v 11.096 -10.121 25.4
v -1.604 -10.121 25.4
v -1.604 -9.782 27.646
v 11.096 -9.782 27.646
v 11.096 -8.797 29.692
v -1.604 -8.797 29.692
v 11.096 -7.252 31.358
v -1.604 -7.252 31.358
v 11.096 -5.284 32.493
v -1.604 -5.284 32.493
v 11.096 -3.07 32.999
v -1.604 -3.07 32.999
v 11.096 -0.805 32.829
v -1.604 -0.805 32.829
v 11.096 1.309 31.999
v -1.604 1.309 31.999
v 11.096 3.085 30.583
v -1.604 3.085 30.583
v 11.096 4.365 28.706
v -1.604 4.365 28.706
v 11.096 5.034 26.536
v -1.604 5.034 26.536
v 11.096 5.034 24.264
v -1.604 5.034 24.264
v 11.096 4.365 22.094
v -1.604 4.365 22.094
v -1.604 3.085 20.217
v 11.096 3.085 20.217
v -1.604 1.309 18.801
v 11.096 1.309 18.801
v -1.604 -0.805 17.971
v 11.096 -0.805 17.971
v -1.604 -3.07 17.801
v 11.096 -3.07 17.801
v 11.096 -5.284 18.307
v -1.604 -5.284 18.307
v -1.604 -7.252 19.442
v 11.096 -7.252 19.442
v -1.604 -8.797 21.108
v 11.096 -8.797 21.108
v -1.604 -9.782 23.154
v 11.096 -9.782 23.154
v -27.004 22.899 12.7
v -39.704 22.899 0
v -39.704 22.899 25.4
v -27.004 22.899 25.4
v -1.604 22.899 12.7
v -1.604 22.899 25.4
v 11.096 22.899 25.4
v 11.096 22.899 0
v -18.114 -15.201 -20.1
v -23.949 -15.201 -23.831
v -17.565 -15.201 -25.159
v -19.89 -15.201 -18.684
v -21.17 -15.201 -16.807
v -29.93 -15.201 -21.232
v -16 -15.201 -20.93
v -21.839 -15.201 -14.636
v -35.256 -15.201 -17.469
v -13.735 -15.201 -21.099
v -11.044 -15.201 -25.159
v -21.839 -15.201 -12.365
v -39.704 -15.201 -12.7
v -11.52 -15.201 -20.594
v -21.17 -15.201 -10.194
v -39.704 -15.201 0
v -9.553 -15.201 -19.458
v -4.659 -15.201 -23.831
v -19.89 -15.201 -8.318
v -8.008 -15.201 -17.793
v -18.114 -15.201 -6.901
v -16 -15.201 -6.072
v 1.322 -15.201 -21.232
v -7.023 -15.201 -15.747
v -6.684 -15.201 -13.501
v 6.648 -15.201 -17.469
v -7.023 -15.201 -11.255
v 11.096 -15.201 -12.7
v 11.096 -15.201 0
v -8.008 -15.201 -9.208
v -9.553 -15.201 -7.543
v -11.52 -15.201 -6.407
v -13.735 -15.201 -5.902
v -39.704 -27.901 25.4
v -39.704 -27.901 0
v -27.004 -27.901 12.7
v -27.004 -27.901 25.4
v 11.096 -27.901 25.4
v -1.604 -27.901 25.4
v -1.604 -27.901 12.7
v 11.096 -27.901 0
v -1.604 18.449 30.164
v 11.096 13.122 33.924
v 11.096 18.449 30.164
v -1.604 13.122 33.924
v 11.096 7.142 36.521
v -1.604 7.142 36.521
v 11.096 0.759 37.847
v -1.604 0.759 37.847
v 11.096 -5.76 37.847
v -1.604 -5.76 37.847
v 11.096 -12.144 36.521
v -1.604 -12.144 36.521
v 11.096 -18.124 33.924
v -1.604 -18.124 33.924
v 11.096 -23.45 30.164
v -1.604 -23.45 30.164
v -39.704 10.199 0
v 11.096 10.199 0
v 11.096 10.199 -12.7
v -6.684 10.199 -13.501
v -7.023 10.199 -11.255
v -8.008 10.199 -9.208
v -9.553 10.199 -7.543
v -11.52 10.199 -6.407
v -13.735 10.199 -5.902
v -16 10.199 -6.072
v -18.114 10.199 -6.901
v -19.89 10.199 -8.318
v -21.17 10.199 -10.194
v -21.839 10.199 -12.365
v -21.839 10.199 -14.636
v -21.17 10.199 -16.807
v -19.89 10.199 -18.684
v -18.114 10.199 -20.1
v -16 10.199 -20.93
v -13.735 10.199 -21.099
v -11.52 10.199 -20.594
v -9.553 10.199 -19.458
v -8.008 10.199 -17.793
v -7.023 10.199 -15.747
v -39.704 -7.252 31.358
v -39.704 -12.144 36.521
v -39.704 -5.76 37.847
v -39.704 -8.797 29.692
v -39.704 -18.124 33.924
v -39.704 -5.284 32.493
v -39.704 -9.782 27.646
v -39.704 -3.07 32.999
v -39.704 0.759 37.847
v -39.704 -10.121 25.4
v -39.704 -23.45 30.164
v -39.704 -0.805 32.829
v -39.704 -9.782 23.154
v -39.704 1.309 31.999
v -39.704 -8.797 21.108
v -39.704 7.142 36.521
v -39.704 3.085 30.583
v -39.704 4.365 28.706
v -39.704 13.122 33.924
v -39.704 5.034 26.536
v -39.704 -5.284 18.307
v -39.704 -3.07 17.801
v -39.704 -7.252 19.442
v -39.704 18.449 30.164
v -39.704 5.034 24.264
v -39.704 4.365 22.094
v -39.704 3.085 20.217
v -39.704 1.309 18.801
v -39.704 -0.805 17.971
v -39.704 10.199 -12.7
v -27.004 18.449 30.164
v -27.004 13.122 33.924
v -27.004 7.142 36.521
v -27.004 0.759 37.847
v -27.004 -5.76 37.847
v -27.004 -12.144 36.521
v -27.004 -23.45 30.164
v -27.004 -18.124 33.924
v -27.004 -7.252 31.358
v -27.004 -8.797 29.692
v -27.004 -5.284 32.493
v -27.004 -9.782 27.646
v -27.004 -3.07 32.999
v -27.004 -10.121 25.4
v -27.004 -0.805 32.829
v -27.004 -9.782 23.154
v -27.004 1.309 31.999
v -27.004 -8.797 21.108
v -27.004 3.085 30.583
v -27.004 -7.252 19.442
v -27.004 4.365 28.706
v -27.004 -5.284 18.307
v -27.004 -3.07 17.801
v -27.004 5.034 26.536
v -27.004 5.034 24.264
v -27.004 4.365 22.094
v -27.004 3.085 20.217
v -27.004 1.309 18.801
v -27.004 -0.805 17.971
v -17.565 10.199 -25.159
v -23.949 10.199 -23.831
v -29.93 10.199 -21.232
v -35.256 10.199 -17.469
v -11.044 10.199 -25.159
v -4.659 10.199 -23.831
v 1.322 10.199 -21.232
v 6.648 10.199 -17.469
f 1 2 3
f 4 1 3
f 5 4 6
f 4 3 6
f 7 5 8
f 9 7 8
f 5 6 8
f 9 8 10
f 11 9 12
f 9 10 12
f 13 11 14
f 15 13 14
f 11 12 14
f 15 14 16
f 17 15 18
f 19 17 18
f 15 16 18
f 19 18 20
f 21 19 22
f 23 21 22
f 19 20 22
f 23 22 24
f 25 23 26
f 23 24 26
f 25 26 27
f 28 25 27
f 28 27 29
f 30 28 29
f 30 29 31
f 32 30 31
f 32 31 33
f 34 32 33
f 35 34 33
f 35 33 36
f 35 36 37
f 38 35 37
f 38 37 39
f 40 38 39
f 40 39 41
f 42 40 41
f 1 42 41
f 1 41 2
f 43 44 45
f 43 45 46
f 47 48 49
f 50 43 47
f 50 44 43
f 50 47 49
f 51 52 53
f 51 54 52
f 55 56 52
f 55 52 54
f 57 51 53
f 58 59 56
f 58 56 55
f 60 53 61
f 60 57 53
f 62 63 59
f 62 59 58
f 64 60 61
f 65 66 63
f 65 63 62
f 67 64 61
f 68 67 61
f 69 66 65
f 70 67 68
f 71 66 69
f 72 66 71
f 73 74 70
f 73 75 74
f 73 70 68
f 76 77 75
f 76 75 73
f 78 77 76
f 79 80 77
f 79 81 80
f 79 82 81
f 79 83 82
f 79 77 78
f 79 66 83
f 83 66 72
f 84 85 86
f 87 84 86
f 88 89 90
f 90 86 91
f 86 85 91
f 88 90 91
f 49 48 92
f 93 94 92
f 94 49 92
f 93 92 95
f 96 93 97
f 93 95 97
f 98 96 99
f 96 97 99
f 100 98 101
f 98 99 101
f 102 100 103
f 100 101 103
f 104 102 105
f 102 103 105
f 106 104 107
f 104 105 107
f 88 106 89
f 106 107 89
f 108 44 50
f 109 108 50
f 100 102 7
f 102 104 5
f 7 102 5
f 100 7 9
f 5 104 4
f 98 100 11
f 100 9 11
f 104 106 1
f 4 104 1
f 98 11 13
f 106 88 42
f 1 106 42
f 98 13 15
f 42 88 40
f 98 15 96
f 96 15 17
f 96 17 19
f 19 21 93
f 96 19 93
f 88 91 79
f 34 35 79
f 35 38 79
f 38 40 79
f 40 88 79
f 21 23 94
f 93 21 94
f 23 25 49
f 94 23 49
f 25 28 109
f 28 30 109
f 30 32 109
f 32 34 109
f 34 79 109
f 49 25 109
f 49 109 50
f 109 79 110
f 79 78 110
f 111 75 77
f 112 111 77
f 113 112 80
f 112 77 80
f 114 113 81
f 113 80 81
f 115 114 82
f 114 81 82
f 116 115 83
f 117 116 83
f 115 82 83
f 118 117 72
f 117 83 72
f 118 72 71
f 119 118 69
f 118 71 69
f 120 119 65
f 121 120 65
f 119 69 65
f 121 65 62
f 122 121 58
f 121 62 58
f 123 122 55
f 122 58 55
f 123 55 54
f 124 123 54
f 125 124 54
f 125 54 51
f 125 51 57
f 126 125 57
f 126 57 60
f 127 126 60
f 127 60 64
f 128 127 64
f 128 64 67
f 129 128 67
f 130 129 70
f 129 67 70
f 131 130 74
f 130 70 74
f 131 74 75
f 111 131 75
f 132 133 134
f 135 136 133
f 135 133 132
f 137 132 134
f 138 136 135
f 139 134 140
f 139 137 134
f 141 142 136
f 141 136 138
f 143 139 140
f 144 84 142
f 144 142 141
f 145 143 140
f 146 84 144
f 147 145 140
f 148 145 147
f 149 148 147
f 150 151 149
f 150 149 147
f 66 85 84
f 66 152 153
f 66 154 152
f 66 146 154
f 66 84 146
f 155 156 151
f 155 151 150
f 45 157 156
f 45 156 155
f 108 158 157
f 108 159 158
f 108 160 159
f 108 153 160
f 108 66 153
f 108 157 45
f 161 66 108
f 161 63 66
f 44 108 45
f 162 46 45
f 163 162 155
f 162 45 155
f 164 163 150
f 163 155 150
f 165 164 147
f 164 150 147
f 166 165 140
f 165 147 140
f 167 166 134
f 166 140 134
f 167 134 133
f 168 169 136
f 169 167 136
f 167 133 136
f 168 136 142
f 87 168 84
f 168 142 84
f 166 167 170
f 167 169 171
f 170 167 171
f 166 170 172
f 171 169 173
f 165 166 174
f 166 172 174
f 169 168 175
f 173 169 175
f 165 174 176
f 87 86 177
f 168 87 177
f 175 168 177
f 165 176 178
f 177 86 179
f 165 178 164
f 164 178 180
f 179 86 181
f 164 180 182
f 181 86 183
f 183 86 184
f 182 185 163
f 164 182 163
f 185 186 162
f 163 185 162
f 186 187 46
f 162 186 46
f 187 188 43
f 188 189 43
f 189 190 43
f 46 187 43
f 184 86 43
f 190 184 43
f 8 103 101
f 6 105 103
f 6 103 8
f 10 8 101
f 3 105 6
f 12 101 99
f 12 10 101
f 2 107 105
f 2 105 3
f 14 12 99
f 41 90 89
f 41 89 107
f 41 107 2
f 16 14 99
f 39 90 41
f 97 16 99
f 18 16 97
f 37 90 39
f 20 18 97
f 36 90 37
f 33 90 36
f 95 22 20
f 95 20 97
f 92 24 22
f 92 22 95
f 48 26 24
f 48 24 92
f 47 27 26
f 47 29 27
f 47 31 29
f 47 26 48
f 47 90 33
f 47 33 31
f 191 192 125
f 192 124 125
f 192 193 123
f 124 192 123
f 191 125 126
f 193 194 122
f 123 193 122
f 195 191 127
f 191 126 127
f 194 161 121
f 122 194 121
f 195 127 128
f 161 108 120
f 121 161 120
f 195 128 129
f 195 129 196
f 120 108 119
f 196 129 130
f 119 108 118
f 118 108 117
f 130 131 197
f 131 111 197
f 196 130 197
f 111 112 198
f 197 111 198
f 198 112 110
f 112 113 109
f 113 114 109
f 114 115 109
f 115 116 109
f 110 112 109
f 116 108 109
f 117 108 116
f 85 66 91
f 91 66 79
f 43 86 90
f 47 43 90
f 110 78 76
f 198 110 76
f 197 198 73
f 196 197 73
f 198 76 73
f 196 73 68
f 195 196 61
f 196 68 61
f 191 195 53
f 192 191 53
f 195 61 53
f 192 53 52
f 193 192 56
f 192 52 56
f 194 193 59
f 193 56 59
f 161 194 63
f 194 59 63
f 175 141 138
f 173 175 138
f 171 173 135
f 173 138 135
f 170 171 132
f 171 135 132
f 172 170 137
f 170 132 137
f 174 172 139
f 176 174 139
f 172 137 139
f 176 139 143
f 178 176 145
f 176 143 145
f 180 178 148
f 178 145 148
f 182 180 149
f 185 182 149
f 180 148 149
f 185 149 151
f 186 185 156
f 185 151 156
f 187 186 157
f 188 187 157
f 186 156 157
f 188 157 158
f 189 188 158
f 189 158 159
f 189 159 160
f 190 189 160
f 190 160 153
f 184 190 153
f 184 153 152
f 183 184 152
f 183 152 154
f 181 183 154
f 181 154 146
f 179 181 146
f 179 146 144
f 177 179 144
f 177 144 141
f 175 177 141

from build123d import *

# Parameters (mm, degrees)
F0_W     = 50.8
F0_H     = 25.4
F1_DEPTH = 12.7
F2_W     = 12.7
F2_H     = 50.8
F3_DEPTH = 25.4
F4_R     = 7.62
F5_DEPTH = 53.34
F6_DEPTH = 25.4
F7_R     = 7.62
F8_DEPTH = 25.4


with BuildPart() as f1:
    # F0 (on Top) → F1 (new body)
    with BuildSketch(Plane.XY):
        Polygon((-27.004177, 22.899404), (-39.704177, 22.899404), (-39.704177, 10.199404), (11.095823, 10.199404), (11.095823, 22.899404), (-1.604177, 22.899404), align=None)
        Polygon((11.095823, -15.200596), (-39.704177, -15.200596), (-39.704177, -27.900596), (-27.004177, -27.900596), (-1.604177, -27.900596), (11.095823, -27.900596), align=None)
        with Locations((-14.304177, -2.500596)):
            Rectangle(F0_W, F0_H)
    extrude(amount=F1_DEPTH)

    # F2 (on face) → F3 (join)
    with BuildSketch(Plane.XY.offset(12.7)):
        with Locations((-33.354177, -2.500596)):
            Rectangle(F2_W, F2_H)
        with Locations((4.745823, -2.500596)):
            Rectangle(F2_W, F2_H)
    extrude(amount=F3_DEPTH)

    # F4 (on face) → F5 (cut)
    with BuildSketch(Plane(origin=(-39.704177, 0, 0), x_dir=(0, -1, 0), z_dir=(-1, 0, 0))):
        with BuildLine():
            ThreePointArc((-22.899404, 25.4), (2.500596, 38.014124), (27.900596, 25.4))
            Line((27.900596, 25.4), (27.900596, 38.1))
            Line((27.900596, 38.1), (-22.899404, 38.1))
            Line((-22.899404, 38.1), (-22.899404, 25.4))
        make_face()
        with Locations((2.500596, 25.4)):
            Circle(F4_R)
    extrude(amount=-F5_DEPTH, mode=Mode.SUBTRACT)

    # F0 (on Top) → F6 (join)
    with BuildSketch(Plane.XY):
        with Locations((-14.304177, -2.500596)):
            Rectangle(F0_W, F0_H)
    extrude(amount=-F6_DEPTH)

    # F7 (on face) → F8 (cut)
    with BuildSketch(Plane.XZ.offset(15.200596)):
        with Locations((-14.304177, -13.500606)):
            Circle(F7_R)
        with BuildLine():
            ThreePointArc((11.095823, -12.7), (-14.304177, -25.326352), (-39.704177, -12.7))
            Line((-39.704177, -12.7), (-39.704177, -25.4))
            Line((-39.704177, -25.4), (11.095823, -25.4))
            Line((11.095823, -25.4), (11.095823, -12.7))
        make_face()
    extrude(amount=-F8_DEPTH, mode=Mode.SUBTRACT)


solid = f1.part
